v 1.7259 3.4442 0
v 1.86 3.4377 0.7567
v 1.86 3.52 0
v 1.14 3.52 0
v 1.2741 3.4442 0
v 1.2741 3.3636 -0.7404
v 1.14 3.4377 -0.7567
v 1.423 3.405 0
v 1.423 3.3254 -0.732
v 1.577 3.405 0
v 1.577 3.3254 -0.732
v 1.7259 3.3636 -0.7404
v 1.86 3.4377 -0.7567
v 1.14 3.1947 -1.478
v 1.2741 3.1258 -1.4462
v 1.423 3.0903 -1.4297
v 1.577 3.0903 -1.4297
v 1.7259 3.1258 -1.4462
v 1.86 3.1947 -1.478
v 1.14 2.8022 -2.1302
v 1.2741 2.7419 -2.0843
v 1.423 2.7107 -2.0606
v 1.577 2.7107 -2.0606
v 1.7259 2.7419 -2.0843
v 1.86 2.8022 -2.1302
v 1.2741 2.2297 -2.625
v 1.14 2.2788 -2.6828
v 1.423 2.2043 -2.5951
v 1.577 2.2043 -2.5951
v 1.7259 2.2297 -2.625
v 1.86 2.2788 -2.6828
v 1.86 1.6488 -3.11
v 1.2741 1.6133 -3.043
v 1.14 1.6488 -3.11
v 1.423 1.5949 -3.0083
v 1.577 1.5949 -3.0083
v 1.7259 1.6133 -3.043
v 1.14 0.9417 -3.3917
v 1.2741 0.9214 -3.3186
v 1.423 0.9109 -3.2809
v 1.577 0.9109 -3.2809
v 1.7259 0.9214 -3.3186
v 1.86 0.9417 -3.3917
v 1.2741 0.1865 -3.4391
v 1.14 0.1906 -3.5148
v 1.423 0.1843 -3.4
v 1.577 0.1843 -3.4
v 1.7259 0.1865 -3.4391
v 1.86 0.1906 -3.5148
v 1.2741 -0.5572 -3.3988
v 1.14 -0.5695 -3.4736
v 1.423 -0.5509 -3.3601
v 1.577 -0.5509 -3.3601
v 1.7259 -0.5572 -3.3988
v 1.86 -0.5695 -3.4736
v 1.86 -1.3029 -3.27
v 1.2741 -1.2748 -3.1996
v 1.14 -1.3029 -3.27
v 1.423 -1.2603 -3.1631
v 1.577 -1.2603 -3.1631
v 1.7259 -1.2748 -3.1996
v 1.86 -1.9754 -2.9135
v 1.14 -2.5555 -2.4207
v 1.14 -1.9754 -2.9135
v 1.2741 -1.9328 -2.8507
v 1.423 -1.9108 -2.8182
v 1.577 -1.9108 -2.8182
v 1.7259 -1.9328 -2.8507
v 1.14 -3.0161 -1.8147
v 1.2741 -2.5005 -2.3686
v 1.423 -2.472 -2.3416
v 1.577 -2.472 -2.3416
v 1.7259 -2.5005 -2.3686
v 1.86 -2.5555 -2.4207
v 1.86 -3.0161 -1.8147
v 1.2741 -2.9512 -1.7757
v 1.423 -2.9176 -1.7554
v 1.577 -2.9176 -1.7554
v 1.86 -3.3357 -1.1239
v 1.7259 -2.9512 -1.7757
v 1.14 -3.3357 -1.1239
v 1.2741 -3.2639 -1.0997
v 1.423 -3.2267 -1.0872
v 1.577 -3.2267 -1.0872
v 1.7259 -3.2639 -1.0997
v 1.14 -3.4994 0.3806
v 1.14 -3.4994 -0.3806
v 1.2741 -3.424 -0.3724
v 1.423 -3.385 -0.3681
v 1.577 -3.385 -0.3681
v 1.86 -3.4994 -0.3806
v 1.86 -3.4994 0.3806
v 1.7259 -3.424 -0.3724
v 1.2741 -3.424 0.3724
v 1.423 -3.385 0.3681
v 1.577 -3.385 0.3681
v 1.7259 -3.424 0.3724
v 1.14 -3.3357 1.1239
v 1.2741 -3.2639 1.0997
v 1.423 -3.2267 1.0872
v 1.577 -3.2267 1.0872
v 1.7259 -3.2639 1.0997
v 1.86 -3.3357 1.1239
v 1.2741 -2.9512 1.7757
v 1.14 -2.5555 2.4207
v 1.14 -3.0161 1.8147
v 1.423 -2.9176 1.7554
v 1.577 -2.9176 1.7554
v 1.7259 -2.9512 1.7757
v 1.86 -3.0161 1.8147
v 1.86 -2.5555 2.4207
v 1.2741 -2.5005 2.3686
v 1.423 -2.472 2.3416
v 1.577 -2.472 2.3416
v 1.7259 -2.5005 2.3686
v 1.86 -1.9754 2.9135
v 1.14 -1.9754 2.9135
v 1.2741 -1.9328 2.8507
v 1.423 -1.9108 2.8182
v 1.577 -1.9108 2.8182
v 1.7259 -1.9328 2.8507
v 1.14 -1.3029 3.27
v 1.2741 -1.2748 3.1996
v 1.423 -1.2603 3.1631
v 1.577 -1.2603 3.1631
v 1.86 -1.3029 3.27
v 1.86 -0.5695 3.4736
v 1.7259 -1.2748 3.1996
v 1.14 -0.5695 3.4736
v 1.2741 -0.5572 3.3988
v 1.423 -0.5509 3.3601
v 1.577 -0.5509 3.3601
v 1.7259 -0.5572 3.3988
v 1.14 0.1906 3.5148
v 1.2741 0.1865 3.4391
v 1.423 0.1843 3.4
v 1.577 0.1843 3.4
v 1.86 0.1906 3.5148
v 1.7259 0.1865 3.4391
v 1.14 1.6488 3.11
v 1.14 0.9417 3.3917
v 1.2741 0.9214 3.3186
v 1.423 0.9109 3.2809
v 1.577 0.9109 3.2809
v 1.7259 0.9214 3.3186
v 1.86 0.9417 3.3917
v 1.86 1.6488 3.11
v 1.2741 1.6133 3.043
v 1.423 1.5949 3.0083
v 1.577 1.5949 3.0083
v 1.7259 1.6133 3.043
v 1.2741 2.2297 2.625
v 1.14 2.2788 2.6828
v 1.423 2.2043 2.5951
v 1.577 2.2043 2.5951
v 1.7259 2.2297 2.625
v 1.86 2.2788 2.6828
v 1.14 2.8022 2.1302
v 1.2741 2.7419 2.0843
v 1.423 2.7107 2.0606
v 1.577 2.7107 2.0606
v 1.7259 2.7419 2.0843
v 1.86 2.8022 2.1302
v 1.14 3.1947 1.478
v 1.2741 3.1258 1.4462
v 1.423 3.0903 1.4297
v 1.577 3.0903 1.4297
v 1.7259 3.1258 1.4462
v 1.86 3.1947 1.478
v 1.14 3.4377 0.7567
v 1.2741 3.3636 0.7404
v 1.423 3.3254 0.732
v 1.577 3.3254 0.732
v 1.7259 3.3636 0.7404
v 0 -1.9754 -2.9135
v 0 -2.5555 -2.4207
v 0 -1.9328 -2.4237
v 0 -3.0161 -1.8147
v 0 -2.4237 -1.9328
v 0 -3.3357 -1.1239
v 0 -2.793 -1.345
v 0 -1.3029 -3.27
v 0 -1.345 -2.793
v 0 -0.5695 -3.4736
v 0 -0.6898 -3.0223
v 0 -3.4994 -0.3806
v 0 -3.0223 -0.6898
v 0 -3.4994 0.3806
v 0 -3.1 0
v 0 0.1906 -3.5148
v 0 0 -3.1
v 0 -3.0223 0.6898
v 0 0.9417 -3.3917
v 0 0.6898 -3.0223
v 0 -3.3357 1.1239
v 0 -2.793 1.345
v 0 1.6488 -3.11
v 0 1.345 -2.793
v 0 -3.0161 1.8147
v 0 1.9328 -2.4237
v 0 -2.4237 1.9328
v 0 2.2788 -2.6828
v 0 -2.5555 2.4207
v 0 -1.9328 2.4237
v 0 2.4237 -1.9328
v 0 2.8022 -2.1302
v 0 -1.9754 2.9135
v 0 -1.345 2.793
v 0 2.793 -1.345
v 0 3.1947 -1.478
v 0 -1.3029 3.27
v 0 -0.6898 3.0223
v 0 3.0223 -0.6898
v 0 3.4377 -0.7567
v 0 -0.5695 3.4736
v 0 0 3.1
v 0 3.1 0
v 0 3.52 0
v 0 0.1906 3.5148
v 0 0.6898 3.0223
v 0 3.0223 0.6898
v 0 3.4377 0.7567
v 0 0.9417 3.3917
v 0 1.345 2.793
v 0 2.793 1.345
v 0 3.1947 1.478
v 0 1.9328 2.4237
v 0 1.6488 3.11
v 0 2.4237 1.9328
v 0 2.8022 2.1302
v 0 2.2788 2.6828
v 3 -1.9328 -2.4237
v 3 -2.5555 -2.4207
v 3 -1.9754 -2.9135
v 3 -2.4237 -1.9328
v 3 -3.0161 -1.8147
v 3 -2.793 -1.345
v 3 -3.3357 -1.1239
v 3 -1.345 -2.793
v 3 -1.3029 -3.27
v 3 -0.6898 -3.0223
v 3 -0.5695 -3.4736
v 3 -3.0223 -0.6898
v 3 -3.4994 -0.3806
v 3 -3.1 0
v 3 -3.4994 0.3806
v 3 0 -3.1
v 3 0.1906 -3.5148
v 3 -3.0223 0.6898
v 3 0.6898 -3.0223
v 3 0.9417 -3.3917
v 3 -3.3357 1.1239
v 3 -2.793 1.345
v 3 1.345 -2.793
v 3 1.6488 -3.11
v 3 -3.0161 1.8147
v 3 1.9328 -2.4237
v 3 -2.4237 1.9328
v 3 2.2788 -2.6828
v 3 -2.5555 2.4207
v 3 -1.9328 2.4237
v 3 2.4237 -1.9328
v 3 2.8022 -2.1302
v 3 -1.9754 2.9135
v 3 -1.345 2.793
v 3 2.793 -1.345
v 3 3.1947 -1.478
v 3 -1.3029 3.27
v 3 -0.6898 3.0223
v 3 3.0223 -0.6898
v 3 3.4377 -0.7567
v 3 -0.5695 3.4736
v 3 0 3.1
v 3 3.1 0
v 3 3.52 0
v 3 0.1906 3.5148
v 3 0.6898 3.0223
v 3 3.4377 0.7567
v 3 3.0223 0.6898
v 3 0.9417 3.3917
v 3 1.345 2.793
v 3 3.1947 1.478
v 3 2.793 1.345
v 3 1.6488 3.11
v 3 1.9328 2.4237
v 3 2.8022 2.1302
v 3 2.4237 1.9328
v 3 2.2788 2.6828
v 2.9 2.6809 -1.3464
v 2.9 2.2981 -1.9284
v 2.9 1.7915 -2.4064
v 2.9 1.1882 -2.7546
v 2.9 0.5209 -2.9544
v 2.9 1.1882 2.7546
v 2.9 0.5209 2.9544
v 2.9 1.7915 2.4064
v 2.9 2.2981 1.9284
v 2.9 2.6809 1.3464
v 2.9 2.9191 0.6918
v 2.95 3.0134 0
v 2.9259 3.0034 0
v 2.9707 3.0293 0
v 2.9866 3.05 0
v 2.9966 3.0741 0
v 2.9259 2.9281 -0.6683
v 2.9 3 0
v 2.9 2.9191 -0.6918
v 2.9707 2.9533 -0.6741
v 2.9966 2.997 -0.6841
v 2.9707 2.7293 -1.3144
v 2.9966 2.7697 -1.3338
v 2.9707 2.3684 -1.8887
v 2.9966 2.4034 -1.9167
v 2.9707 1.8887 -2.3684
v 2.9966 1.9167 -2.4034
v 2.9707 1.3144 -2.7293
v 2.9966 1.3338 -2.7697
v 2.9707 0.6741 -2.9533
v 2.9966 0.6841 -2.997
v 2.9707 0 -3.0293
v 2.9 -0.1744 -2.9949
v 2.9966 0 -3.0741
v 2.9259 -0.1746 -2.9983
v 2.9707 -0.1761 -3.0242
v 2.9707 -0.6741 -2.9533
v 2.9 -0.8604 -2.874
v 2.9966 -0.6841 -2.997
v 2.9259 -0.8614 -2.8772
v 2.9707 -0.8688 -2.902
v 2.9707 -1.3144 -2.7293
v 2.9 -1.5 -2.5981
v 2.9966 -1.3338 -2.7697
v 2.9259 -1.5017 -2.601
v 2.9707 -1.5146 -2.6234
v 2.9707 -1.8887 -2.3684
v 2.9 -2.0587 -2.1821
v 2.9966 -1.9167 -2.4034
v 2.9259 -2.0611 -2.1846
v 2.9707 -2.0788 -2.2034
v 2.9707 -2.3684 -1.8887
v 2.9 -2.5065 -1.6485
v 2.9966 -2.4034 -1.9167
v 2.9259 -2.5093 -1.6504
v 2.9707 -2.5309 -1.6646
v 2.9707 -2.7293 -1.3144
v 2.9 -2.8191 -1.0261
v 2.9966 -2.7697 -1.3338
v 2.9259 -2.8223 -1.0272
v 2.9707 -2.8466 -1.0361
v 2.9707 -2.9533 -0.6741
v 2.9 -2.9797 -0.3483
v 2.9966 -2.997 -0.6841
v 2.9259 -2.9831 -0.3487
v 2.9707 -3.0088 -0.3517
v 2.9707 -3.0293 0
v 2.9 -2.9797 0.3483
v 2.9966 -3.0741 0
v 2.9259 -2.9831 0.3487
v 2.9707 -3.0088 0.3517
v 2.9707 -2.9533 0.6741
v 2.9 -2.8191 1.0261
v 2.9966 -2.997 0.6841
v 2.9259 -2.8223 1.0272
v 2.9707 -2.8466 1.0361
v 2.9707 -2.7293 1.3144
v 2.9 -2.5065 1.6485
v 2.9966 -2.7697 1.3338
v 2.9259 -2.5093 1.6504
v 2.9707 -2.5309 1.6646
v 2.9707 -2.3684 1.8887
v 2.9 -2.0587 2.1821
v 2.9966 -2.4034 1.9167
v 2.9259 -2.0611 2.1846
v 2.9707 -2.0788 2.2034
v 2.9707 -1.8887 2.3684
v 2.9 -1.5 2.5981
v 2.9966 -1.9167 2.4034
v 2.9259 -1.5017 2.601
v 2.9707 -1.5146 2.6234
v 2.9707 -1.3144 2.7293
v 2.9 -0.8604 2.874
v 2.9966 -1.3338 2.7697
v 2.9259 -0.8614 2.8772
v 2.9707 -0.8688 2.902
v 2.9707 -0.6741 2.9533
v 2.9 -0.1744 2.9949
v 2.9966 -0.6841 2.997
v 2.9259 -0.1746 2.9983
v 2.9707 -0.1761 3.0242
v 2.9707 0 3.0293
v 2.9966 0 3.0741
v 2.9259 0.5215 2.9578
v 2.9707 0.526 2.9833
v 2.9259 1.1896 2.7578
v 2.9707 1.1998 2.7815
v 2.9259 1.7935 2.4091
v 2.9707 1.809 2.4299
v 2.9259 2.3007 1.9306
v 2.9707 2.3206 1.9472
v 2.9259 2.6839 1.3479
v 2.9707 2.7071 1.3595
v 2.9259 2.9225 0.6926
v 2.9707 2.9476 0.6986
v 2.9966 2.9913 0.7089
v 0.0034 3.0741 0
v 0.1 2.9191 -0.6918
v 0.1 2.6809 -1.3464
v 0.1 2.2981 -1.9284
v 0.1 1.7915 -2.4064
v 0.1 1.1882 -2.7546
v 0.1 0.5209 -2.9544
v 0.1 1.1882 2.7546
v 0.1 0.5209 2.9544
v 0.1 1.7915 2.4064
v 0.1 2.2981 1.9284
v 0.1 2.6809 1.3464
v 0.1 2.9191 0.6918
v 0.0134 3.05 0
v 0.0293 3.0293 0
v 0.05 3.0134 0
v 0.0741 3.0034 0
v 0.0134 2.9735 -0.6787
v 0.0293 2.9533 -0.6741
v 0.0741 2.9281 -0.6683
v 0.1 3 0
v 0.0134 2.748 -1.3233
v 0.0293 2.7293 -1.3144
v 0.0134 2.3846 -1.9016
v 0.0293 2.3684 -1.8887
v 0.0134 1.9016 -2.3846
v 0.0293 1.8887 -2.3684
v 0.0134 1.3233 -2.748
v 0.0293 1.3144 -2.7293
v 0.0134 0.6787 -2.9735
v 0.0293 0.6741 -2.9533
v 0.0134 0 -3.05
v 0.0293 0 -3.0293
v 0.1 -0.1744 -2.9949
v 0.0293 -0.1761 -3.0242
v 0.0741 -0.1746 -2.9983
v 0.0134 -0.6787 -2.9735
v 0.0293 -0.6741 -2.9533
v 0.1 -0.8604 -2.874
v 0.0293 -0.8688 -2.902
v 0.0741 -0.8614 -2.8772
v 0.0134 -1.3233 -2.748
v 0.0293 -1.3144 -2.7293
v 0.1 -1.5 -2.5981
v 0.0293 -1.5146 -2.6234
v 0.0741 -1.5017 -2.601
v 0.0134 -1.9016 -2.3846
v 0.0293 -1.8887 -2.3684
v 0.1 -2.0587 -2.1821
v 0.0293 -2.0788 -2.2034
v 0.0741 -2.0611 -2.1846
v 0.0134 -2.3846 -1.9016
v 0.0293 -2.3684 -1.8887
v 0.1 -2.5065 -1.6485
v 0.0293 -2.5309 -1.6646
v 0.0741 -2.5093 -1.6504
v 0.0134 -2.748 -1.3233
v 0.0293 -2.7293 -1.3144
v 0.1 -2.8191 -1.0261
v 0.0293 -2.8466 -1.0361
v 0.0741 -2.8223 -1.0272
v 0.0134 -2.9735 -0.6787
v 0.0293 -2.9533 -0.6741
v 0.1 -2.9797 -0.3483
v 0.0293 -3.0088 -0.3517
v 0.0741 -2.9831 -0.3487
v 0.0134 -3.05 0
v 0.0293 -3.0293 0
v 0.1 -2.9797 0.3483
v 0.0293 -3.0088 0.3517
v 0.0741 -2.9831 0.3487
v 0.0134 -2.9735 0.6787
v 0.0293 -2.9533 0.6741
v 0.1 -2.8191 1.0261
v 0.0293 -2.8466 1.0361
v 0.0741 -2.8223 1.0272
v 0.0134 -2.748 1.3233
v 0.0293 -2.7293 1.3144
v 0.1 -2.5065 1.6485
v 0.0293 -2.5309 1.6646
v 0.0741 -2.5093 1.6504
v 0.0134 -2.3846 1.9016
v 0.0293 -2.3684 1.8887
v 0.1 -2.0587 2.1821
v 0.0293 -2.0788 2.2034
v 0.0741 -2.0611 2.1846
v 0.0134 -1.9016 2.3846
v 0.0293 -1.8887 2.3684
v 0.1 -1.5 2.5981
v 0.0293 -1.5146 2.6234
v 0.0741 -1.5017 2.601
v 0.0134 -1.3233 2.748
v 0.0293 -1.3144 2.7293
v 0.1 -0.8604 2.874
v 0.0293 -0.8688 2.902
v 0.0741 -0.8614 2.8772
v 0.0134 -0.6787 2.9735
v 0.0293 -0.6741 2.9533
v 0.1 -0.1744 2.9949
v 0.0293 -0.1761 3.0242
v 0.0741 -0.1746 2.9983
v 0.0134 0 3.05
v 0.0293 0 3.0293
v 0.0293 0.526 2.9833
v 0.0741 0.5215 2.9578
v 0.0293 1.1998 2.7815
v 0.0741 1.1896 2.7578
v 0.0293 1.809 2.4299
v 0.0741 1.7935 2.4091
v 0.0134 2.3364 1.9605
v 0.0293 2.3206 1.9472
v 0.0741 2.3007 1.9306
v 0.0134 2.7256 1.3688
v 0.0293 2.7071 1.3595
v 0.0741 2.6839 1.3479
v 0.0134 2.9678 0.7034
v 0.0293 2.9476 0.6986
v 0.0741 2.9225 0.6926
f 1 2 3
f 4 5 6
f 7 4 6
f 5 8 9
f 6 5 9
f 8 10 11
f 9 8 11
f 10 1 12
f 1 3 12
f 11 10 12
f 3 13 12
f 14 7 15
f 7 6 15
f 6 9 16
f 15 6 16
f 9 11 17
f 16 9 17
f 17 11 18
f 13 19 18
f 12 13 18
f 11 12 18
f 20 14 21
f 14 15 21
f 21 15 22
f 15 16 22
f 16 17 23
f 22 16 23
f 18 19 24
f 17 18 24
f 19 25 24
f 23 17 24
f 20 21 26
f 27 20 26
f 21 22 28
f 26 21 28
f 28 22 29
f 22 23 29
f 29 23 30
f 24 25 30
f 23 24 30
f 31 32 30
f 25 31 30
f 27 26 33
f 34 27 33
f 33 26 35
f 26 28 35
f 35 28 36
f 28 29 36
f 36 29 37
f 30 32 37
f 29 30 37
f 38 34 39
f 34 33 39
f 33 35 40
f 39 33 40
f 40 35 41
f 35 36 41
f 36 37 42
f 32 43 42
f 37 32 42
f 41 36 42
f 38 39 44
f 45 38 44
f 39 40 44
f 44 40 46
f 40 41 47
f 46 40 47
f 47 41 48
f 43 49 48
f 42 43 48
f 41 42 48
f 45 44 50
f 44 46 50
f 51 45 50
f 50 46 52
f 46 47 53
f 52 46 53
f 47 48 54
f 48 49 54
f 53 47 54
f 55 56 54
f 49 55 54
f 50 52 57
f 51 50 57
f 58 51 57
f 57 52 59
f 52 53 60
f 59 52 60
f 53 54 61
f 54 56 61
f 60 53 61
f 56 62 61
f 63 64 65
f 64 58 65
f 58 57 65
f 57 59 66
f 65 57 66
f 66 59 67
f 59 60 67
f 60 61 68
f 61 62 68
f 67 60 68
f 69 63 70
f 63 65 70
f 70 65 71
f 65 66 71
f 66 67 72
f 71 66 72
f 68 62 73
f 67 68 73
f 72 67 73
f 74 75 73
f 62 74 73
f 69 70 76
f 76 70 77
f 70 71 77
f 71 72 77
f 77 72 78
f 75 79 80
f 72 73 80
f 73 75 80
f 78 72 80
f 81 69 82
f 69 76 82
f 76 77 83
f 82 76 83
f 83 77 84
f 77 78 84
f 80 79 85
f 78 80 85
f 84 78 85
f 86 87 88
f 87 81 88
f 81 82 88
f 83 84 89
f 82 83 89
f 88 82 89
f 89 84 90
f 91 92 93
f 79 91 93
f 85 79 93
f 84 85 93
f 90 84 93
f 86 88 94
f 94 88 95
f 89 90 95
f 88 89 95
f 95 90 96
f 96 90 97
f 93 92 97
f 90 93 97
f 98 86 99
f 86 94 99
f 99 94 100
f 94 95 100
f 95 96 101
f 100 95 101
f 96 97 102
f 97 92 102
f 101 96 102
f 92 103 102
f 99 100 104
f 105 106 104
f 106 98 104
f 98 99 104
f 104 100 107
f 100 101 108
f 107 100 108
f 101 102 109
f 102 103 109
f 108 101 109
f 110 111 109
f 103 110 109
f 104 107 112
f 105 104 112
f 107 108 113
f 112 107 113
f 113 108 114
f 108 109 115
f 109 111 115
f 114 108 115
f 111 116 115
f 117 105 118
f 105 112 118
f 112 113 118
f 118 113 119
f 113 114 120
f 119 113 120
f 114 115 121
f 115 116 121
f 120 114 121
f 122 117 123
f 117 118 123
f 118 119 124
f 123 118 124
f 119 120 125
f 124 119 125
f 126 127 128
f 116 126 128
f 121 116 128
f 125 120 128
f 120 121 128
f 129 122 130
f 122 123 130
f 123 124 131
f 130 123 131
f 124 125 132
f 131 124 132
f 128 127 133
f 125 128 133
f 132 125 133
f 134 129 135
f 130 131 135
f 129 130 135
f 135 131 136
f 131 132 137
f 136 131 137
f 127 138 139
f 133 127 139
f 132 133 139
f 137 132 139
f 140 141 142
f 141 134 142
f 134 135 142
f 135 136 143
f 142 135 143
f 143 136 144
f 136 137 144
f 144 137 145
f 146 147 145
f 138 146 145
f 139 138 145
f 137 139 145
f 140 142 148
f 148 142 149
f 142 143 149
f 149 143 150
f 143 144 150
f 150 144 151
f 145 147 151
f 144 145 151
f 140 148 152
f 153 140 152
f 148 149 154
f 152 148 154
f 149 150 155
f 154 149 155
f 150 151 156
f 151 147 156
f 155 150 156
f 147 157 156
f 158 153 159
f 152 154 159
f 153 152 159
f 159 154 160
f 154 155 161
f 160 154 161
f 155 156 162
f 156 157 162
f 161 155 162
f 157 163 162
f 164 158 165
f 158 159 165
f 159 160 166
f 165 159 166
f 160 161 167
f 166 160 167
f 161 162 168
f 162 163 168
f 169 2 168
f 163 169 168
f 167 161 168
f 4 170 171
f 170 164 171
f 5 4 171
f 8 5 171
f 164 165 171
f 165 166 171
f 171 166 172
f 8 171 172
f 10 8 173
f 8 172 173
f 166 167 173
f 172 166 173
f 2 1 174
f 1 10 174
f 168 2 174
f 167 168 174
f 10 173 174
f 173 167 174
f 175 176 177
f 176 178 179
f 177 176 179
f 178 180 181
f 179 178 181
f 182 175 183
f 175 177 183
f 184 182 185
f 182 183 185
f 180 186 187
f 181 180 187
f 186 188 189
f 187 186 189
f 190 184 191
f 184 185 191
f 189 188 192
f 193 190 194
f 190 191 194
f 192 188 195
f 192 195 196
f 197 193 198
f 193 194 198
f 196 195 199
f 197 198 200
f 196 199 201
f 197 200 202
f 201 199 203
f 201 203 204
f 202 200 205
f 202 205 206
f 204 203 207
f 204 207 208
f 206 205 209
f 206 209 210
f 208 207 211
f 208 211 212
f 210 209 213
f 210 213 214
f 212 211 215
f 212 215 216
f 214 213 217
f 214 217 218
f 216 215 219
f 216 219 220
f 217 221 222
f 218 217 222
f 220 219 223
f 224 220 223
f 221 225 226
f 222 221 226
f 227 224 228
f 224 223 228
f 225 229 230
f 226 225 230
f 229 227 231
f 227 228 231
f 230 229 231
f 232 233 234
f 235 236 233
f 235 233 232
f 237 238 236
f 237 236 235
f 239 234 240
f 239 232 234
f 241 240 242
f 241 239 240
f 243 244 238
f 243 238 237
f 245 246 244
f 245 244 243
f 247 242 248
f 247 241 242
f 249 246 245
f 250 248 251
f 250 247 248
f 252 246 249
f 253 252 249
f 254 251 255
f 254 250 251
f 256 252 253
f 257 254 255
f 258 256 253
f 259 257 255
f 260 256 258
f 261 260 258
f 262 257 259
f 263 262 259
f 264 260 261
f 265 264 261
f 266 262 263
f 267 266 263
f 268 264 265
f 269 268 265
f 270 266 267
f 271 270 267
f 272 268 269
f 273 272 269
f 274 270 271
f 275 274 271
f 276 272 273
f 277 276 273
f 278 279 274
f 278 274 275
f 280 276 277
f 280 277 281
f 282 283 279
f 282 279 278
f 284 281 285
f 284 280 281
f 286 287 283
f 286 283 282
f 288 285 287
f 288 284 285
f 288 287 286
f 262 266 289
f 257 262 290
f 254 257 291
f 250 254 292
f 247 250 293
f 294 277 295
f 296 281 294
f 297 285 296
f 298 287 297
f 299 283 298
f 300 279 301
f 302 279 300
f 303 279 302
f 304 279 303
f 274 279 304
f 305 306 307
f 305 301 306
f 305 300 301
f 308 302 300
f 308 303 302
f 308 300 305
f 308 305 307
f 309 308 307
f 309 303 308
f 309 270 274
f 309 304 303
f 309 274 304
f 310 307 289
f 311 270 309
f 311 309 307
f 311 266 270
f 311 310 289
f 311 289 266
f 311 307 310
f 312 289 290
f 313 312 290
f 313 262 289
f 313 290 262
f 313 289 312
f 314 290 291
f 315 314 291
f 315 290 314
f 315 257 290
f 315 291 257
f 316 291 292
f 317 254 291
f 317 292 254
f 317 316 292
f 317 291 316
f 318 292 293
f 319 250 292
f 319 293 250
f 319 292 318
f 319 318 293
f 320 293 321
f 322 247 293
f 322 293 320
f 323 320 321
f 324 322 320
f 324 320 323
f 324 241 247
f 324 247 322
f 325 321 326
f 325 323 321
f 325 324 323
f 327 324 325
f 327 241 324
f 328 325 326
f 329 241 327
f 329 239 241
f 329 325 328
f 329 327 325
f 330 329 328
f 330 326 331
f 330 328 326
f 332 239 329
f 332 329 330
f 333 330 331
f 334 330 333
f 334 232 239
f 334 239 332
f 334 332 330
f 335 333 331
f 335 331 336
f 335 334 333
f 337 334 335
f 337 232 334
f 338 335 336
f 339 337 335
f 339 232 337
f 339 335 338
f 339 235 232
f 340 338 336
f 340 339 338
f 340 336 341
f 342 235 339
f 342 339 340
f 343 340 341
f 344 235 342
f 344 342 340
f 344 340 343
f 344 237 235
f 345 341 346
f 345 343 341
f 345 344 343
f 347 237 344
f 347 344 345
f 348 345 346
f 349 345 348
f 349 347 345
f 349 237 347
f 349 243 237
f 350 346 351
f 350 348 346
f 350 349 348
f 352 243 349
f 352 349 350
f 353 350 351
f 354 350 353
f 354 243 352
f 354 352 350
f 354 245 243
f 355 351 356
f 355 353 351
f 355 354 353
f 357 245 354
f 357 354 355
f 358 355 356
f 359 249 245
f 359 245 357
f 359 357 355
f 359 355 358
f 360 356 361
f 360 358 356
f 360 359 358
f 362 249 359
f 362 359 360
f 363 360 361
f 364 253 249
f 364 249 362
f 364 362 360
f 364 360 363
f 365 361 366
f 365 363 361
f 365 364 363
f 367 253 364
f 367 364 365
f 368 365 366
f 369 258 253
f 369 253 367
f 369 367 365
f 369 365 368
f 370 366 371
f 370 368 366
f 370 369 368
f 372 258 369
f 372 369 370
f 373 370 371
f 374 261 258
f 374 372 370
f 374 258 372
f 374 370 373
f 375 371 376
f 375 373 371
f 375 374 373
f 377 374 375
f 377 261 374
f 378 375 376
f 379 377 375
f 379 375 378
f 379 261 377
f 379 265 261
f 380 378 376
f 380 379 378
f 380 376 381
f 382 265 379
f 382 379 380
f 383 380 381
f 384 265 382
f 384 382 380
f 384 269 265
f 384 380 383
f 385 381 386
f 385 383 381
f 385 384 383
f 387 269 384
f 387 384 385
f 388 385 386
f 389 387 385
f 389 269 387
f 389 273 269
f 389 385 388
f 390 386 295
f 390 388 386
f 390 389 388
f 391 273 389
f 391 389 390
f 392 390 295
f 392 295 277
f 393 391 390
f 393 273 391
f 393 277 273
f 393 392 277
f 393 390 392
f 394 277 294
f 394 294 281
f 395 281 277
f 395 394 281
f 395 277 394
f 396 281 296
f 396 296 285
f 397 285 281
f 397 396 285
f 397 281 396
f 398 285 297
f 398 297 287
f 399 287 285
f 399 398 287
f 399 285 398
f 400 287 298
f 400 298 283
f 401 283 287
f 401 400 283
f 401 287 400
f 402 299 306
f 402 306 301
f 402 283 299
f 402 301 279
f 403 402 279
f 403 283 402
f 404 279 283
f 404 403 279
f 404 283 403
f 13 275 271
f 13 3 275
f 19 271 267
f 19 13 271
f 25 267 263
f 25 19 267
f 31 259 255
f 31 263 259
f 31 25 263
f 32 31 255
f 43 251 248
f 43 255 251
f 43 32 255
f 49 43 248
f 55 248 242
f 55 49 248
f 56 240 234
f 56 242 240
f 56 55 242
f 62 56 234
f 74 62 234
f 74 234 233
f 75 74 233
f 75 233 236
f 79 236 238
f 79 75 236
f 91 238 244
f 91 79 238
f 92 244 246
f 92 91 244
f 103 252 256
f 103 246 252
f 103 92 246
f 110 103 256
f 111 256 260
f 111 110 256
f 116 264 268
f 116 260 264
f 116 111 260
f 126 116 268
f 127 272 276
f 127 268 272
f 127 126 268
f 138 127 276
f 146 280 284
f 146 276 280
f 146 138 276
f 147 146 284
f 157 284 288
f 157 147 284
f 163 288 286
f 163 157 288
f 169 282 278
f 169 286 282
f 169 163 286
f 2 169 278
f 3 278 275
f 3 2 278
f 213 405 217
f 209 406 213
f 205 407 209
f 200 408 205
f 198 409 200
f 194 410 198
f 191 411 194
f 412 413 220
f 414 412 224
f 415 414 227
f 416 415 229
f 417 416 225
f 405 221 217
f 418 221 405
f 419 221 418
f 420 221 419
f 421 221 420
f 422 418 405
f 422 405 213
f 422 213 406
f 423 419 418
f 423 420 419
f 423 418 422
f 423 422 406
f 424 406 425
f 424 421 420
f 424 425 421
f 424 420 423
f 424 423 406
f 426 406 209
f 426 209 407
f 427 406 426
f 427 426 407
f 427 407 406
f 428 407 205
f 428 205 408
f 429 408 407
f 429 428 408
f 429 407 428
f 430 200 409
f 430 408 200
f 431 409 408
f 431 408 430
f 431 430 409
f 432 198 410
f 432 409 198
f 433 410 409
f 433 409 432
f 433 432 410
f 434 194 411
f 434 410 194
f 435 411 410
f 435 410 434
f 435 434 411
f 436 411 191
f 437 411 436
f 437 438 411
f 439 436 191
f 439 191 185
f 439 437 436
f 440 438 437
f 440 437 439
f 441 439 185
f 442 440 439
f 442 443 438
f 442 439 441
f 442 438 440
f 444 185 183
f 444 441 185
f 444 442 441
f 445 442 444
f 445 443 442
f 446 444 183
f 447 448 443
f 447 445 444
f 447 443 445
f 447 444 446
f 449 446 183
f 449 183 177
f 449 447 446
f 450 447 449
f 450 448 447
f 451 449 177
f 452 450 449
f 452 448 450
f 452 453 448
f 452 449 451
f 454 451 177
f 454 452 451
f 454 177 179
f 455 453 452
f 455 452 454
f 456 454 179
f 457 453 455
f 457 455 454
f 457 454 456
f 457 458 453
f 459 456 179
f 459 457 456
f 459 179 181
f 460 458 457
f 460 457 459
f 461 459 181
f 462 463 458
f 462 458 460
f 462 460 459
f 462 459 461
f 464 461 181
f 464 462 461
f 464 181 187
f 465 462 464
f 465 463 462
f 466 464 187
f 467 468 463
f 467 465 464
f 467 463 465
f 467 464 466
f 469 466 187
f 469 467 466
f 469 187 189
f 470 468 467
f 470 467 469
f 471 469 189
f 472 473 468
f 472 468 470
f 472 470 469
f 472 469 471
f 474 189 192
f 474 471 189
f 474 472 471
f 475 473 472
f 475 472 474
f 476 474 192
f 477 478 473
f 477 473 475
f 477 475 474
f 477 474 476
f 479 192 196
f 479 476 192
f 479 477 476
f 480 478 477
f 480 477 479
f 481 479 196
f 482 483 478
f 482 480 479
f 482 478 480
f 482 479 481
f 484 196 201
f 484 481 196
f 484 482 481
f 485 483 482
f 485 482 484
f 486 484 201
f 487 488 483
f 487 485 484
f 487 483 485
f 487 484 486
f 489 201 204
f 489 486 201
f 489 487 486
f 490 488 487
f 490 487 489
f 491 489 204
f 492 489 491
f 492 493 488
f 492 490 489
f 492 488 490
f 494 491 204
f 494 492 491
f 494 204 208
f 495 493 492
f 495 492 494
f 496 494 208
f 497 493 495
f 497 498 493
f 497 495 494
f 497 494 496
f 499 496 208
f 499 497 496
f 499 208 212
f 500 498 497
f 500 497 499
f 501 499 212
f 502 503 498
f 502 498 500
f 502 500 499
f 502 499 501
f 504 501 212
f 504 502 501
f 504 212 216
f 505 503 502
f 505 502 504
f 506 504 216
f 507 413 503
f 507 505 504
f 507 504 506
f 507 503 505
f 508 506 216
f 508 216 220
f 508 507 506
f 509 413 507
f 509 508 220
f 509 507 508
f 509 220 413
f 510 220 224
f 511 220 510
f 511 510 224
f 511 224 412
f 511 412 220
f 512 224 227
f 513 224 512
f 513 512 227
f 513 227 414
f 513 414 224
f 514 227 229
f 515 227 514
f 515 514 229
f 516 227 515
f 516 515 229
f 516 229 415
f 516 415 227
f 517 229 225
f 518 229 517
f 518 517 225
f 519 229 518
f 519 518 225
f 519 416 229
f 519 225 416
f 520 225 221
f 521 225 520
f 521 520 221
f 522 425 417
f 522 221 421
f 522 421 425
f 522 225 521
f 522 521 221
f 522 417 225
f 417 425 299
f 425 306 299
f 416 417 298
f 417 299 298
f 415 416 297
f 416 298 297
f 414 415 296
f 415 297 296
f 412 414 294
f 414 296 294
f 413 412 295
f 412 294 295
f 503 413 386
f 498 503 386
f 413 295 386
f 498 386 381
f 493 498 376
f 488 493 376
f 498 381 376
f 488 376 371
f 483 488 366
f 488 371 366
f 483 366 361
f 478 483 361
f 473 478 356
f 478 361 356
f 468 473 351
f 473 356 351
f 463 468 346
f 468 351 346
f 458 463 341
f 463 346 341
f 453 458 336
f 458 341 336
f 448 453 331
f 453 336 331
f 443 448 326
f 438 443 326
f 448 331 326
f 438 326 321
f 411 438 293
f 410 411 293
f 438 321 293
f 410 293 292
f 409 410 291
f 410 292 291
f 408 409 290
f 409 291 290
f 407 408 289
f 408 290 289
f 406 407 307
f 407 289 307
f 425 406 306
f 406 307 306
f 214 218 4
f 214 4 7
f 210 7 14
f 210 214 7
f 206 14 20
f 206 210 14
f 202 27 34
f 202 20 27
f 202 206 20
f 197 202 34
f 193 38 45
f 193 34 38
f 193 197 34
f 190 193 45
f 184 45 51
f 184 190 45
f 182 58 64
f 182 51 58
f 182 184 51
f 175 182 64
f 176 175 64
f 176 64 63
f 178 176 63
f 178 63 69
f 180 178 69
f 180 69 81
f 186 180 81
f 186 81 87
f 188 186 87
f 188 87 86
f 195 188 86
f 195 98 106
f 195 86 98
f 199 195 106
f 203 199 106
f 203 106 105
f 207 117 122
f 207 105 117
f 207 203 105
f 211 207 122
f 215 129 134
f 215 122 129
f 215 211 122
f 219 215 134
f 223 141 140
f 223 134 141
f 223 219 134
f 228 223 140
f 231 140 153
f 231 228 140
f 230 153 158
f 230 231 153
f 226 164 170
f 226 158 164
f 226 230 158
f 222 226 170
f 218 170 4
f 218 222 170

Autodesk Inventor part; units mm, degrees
sketch "Sketch_1" plane through (0, 0, 0) normal (0, 0, 1) x (1, 0, 0)
  line L0 (3, 0) -> (0, 0)
  arc A0 (0, 3.1) -> (0.1, 3) centre (0.1, 3.1) ccw
  line L1 (0.1, 3) -> (2.9, 3)
  arc A1 (2.9, 3) -> (3, 3.1) centre (2.9, 3.1) ccw
  line L2 (3, 3.1) -> (3, 3.52)
  line L3 (3, 3.52) -> (1.86, 3.52)
  arc A2 (1.14, 3.52) -> (1.86, 3.52) centre (1.5, 4) ccw
  line L4 (1.14, 3.52) -> (0, 3.52)
  line L5 (0, 3.52) -> (0, 3.1)
revolve "Revolution1" add sketch "Sketch_1" angle 360 about axis through (3, 0, 0) along (1, 0, 0)
ref_plane "ip_st_ir_1_1_XY" through (1.5, 4, 0) normal (1, 0, 0) x (0, 0, -1)
ref_plane "ip_st_ir_1_1_YZ" through (1.5, 4, 0) normal (0, 0, -1) x (0, 1, 0)
ref_plane "ip_st_ir_1_1_ZX" through (1.5, 4, 0) normal (0, 1, 0) x (1, 0, 0)
ref_plane "ip_st_ir_1_10_XY" through (1.5, -3.6955, -1.5307) normal (1, 0, 0) x (0, 0, -1)
ref_plane "ip_st_ir_1_10_YZ" through (1.5, -3.6955, -1.5307) normal (0, 0, -1) x (0, 1, 0)
ref_plane "ip_st_ir_1_10_ZX" through (1.5, -3.6955, -1.5307) normal (0, 1, 0) x (1, 0, 0)
ref_plane "ip_st_ir_1_11_XY" through (1.5, -2.8284, -2.8284) normal (1, 0, 0) x (0, 0, -1)
ref_plane "ip_st_ir_1_11_YZ" through (1.5, -2.8284, -2.8284) normal (0, 0, -1) x (0, 1, 0)
ref_plane "ip_st_ir_1_11_ZX" through (1.5, -2.8284, -2.8284) normal (0, 1, 0) x (1, 0, 0)
ref_plane "ip_st_ir_1_12_XY" through (1.5, -1.5307, -3.6955) normal (1, 0, 0) x (0, 0, -1)
ref_plane "ip_st_ir_1_12_YZ" through (1.5, -1.5307, -3.6955) normal (0, 0, -1) x (0, 1, 0)
ref_plane "ip_st_ir_1_12_ZX" through (1.5, -1.5307, -3.6955) normal (0, 1, 0) x (1, 0, 0)
ref_plane "ip_st_ir_1_13_XY" through (1.5, 0, -4) normal (1, 0, 0) x (0, 0, -1)
ref_plane "ip_st_ir_1_13_YZ" through (1.5, 0, -4) normal (0, 0, -1) x (0, 1, 0)
ref_plane "ip_st_ir_1_13_ZX" through (1.5, 0, -4) normal (0, 1, 0) x (1, 0, 0)
ref_plane "ip_st_ir_1_14_XY" through (1.5, 1.5307, -3.6955) normal (1, 0, 0) x (0, 0, -1)
ref_plane "ip_st_ir_1_14_YZ" through (1.5, 1.5307, -3.6955) normal (0, 0, -1) x (0, 1, 0)
ref_plane "ip_st_ir_1_14_ZX" through (1.5, 1.5307, -3.6955) normal (0, 1, 0) x (1, 0, 0)
ref_plane "ip_st_ir_1_15_XY" through (1.5, 2.8284, -2.8284) normal (1, 0, 0) x (0, 0, -1)
ref_plane "ip_st_ir_1_15_YZ" through (1.5, 2.8284, -2.8284) normal (0, 0, -1) x (0, 1, 0)
ref_plane "ip_st_ir_1_15_ZX" through (1.5, 2.8284, -2.8284) normal (0, 1, 0) x (1, 0, 0)
ref_plane "ip_st_ir_1_16_XY" through (1.5, 3.6955, -1.5307) normal (1, 0, 0) x (0, 0, -1)
ref_plane "ip_st_ir_1_16_YZ" through (1.5, 3.6955, -1.5307) normal (0, 0, -1) x (0, 1, 0)
ref_plane "ip_st_ir_1_16_ZX" through (1.5, 3.6955, -1.5307) normal (0, 1, 0) x (1, 0, 0)
ref_plane "ip_st_ir_1_2_XY" through (1.5, 3.6955, 1.5307) normal (1, 0, 0) x (0, 0, -1)
ref_plane "ip_st_ir_1_2_YZ" through (1.5, 3.6955, 1.5307) normal (0, 0, -1) x (0, 1, 0)
ref_plane "ip_st_ir_1_2_ZX" through (1.5, 3.6955, 1.5307) normal (0, 1, 0) x (1, 0, 0)
ref_plane "ip_st_ir_1_3_XY" through (1.5, 2.8284, 2.8284) normal (1, 0, 0) x (0, 0, -1)
ref_plane "ip_st_ir_1_3_YZ" through (1.5, 2.8284, 2.8284) normal (0, 0, -1) x (0, 1, 0)
ref_plane "ip_st_ir_1_3_ZX" through (1.5, 2.8284, 2.8284) normal (0, 1, 0) x (1, 0, 0)
ref_plane "ip_st_ir_1_4_XY" through (1.5, 1.5307, 3.6955) normal (1, 0, 0) x (0, 0, -1)
ref_plane "ip_st_ir_1_4_YZ" through (1.5, 1.5307, 3.6955) normal (0, 0, -1) x (0, 1, 0)
ref_plane "ip_st_ir_1_4_ZX" through (1.5, 1.5307, 3.6955) normal (0, 1, 0) x (1, 0, 0)
ref_plane "ip_st_ir_1_5_XY" through (1.5, 0, 4) normal (1, 0, 0) x (0, 0, -1)
ref_plane "ip_st_ir_1_5_YZ" through (1.5, 0, 4) normal (0, 0, -1) x (0, 1, 0)
ref_plane "ip_st_ir_1_5_ZX" through (1.5, 0, 4) normal (0, 1, 0) x (1, 0, 0)
ref_plane "ip_st_ir_1_6_XY" through (1.5, -1.5307, 3.6955) normal (1, 0, 0) x (0, 0, -1)
ref_plane "ip_st_ir_1_6_YZ" through (1.5, -1.5307, 3.6955) normal (0, 0, -1) x (0, 1, 0)
ref_plane "ip_st_ir_1_6_ZX" through (1.5, -1.5307, 3.6955) normal (0, 1, 0) x (1, 0, 0)
ref_plane "ip_st_ir_1_7_XY" through (1.5, -2.8284, 2.8284) normal (1, 0, 0) x (0, 0, -1)
ref_plane "ip_st_ir_1_7_YZ" through (1.5, -2.8284, 2.8284) normal (0, 0, -1) x (0, 1, 0)
ref_plane "ip_st_ir_1_7_ZX" through (1.5, -2.8284, 2.8284) normal (0, 1, 0) x (1, 0, 0)
ref_plane "ip_st_ir_1_8_XY" through (1.5, -3.6955, 1.5307) normal (1, 0, 0) x (0, 0, -1)
ref_plane "ip_st_ir_1_8_YZ" through (1.5, -3.6955, 1.5307) normal (0, 0, -1) x (0, 1, 0)
ref_plane "ip_st_ir_1_8_ZX" through (1.5, -3.6955, 1.5307) normal (0, 1, 0) x (1, 0, 0)
ref_plane "ip_st_ir_1_9_XY" through (1.5, -4, 0) normal (1, 0, 0) x (0, 0, -1)
ref_plane "ip_st_ir_1_9_YZ" through (1.5, -4, 0) normal (0, 0, -1) x (0, 1, 0)
ref_plane "ip_st_ir_1_9_ZX" through (1.5, -4, 0) normal (0, 1, 0) x (1, 0, 0)
ref_plane "ip_st_ir_1a_XY" through (0, 0, 0) normal (1, 0, 0) x (0, 0, -1)
ref_plane "ip_st_ir_1a_YZ" through (0, 0, 0) normal (0, 0, -1) x (0, 1, 0)
ref_plane "ip_st_ir_1a_ZX" through (0, 0, 0) normal (0, 1, 0) x (1, 0, 0)
ref_plane "ip_st_ir_2a_XY" through (0.1992, 0, 0) normal (1, 0, 0) x (0, 0, -1)
ref_plane "ip_st_ir_2a_YZ" through (0.1992, 0, 0) normal (0, 0, -1) x (0, 1, 0)
ref_plane "ip_st_ir_2a_ZX" through (0.1992, 0, 0) normal (0, 1, 0) x (1, 0, 0)
properties part number "MR106ZZ1 Inner Ring"
